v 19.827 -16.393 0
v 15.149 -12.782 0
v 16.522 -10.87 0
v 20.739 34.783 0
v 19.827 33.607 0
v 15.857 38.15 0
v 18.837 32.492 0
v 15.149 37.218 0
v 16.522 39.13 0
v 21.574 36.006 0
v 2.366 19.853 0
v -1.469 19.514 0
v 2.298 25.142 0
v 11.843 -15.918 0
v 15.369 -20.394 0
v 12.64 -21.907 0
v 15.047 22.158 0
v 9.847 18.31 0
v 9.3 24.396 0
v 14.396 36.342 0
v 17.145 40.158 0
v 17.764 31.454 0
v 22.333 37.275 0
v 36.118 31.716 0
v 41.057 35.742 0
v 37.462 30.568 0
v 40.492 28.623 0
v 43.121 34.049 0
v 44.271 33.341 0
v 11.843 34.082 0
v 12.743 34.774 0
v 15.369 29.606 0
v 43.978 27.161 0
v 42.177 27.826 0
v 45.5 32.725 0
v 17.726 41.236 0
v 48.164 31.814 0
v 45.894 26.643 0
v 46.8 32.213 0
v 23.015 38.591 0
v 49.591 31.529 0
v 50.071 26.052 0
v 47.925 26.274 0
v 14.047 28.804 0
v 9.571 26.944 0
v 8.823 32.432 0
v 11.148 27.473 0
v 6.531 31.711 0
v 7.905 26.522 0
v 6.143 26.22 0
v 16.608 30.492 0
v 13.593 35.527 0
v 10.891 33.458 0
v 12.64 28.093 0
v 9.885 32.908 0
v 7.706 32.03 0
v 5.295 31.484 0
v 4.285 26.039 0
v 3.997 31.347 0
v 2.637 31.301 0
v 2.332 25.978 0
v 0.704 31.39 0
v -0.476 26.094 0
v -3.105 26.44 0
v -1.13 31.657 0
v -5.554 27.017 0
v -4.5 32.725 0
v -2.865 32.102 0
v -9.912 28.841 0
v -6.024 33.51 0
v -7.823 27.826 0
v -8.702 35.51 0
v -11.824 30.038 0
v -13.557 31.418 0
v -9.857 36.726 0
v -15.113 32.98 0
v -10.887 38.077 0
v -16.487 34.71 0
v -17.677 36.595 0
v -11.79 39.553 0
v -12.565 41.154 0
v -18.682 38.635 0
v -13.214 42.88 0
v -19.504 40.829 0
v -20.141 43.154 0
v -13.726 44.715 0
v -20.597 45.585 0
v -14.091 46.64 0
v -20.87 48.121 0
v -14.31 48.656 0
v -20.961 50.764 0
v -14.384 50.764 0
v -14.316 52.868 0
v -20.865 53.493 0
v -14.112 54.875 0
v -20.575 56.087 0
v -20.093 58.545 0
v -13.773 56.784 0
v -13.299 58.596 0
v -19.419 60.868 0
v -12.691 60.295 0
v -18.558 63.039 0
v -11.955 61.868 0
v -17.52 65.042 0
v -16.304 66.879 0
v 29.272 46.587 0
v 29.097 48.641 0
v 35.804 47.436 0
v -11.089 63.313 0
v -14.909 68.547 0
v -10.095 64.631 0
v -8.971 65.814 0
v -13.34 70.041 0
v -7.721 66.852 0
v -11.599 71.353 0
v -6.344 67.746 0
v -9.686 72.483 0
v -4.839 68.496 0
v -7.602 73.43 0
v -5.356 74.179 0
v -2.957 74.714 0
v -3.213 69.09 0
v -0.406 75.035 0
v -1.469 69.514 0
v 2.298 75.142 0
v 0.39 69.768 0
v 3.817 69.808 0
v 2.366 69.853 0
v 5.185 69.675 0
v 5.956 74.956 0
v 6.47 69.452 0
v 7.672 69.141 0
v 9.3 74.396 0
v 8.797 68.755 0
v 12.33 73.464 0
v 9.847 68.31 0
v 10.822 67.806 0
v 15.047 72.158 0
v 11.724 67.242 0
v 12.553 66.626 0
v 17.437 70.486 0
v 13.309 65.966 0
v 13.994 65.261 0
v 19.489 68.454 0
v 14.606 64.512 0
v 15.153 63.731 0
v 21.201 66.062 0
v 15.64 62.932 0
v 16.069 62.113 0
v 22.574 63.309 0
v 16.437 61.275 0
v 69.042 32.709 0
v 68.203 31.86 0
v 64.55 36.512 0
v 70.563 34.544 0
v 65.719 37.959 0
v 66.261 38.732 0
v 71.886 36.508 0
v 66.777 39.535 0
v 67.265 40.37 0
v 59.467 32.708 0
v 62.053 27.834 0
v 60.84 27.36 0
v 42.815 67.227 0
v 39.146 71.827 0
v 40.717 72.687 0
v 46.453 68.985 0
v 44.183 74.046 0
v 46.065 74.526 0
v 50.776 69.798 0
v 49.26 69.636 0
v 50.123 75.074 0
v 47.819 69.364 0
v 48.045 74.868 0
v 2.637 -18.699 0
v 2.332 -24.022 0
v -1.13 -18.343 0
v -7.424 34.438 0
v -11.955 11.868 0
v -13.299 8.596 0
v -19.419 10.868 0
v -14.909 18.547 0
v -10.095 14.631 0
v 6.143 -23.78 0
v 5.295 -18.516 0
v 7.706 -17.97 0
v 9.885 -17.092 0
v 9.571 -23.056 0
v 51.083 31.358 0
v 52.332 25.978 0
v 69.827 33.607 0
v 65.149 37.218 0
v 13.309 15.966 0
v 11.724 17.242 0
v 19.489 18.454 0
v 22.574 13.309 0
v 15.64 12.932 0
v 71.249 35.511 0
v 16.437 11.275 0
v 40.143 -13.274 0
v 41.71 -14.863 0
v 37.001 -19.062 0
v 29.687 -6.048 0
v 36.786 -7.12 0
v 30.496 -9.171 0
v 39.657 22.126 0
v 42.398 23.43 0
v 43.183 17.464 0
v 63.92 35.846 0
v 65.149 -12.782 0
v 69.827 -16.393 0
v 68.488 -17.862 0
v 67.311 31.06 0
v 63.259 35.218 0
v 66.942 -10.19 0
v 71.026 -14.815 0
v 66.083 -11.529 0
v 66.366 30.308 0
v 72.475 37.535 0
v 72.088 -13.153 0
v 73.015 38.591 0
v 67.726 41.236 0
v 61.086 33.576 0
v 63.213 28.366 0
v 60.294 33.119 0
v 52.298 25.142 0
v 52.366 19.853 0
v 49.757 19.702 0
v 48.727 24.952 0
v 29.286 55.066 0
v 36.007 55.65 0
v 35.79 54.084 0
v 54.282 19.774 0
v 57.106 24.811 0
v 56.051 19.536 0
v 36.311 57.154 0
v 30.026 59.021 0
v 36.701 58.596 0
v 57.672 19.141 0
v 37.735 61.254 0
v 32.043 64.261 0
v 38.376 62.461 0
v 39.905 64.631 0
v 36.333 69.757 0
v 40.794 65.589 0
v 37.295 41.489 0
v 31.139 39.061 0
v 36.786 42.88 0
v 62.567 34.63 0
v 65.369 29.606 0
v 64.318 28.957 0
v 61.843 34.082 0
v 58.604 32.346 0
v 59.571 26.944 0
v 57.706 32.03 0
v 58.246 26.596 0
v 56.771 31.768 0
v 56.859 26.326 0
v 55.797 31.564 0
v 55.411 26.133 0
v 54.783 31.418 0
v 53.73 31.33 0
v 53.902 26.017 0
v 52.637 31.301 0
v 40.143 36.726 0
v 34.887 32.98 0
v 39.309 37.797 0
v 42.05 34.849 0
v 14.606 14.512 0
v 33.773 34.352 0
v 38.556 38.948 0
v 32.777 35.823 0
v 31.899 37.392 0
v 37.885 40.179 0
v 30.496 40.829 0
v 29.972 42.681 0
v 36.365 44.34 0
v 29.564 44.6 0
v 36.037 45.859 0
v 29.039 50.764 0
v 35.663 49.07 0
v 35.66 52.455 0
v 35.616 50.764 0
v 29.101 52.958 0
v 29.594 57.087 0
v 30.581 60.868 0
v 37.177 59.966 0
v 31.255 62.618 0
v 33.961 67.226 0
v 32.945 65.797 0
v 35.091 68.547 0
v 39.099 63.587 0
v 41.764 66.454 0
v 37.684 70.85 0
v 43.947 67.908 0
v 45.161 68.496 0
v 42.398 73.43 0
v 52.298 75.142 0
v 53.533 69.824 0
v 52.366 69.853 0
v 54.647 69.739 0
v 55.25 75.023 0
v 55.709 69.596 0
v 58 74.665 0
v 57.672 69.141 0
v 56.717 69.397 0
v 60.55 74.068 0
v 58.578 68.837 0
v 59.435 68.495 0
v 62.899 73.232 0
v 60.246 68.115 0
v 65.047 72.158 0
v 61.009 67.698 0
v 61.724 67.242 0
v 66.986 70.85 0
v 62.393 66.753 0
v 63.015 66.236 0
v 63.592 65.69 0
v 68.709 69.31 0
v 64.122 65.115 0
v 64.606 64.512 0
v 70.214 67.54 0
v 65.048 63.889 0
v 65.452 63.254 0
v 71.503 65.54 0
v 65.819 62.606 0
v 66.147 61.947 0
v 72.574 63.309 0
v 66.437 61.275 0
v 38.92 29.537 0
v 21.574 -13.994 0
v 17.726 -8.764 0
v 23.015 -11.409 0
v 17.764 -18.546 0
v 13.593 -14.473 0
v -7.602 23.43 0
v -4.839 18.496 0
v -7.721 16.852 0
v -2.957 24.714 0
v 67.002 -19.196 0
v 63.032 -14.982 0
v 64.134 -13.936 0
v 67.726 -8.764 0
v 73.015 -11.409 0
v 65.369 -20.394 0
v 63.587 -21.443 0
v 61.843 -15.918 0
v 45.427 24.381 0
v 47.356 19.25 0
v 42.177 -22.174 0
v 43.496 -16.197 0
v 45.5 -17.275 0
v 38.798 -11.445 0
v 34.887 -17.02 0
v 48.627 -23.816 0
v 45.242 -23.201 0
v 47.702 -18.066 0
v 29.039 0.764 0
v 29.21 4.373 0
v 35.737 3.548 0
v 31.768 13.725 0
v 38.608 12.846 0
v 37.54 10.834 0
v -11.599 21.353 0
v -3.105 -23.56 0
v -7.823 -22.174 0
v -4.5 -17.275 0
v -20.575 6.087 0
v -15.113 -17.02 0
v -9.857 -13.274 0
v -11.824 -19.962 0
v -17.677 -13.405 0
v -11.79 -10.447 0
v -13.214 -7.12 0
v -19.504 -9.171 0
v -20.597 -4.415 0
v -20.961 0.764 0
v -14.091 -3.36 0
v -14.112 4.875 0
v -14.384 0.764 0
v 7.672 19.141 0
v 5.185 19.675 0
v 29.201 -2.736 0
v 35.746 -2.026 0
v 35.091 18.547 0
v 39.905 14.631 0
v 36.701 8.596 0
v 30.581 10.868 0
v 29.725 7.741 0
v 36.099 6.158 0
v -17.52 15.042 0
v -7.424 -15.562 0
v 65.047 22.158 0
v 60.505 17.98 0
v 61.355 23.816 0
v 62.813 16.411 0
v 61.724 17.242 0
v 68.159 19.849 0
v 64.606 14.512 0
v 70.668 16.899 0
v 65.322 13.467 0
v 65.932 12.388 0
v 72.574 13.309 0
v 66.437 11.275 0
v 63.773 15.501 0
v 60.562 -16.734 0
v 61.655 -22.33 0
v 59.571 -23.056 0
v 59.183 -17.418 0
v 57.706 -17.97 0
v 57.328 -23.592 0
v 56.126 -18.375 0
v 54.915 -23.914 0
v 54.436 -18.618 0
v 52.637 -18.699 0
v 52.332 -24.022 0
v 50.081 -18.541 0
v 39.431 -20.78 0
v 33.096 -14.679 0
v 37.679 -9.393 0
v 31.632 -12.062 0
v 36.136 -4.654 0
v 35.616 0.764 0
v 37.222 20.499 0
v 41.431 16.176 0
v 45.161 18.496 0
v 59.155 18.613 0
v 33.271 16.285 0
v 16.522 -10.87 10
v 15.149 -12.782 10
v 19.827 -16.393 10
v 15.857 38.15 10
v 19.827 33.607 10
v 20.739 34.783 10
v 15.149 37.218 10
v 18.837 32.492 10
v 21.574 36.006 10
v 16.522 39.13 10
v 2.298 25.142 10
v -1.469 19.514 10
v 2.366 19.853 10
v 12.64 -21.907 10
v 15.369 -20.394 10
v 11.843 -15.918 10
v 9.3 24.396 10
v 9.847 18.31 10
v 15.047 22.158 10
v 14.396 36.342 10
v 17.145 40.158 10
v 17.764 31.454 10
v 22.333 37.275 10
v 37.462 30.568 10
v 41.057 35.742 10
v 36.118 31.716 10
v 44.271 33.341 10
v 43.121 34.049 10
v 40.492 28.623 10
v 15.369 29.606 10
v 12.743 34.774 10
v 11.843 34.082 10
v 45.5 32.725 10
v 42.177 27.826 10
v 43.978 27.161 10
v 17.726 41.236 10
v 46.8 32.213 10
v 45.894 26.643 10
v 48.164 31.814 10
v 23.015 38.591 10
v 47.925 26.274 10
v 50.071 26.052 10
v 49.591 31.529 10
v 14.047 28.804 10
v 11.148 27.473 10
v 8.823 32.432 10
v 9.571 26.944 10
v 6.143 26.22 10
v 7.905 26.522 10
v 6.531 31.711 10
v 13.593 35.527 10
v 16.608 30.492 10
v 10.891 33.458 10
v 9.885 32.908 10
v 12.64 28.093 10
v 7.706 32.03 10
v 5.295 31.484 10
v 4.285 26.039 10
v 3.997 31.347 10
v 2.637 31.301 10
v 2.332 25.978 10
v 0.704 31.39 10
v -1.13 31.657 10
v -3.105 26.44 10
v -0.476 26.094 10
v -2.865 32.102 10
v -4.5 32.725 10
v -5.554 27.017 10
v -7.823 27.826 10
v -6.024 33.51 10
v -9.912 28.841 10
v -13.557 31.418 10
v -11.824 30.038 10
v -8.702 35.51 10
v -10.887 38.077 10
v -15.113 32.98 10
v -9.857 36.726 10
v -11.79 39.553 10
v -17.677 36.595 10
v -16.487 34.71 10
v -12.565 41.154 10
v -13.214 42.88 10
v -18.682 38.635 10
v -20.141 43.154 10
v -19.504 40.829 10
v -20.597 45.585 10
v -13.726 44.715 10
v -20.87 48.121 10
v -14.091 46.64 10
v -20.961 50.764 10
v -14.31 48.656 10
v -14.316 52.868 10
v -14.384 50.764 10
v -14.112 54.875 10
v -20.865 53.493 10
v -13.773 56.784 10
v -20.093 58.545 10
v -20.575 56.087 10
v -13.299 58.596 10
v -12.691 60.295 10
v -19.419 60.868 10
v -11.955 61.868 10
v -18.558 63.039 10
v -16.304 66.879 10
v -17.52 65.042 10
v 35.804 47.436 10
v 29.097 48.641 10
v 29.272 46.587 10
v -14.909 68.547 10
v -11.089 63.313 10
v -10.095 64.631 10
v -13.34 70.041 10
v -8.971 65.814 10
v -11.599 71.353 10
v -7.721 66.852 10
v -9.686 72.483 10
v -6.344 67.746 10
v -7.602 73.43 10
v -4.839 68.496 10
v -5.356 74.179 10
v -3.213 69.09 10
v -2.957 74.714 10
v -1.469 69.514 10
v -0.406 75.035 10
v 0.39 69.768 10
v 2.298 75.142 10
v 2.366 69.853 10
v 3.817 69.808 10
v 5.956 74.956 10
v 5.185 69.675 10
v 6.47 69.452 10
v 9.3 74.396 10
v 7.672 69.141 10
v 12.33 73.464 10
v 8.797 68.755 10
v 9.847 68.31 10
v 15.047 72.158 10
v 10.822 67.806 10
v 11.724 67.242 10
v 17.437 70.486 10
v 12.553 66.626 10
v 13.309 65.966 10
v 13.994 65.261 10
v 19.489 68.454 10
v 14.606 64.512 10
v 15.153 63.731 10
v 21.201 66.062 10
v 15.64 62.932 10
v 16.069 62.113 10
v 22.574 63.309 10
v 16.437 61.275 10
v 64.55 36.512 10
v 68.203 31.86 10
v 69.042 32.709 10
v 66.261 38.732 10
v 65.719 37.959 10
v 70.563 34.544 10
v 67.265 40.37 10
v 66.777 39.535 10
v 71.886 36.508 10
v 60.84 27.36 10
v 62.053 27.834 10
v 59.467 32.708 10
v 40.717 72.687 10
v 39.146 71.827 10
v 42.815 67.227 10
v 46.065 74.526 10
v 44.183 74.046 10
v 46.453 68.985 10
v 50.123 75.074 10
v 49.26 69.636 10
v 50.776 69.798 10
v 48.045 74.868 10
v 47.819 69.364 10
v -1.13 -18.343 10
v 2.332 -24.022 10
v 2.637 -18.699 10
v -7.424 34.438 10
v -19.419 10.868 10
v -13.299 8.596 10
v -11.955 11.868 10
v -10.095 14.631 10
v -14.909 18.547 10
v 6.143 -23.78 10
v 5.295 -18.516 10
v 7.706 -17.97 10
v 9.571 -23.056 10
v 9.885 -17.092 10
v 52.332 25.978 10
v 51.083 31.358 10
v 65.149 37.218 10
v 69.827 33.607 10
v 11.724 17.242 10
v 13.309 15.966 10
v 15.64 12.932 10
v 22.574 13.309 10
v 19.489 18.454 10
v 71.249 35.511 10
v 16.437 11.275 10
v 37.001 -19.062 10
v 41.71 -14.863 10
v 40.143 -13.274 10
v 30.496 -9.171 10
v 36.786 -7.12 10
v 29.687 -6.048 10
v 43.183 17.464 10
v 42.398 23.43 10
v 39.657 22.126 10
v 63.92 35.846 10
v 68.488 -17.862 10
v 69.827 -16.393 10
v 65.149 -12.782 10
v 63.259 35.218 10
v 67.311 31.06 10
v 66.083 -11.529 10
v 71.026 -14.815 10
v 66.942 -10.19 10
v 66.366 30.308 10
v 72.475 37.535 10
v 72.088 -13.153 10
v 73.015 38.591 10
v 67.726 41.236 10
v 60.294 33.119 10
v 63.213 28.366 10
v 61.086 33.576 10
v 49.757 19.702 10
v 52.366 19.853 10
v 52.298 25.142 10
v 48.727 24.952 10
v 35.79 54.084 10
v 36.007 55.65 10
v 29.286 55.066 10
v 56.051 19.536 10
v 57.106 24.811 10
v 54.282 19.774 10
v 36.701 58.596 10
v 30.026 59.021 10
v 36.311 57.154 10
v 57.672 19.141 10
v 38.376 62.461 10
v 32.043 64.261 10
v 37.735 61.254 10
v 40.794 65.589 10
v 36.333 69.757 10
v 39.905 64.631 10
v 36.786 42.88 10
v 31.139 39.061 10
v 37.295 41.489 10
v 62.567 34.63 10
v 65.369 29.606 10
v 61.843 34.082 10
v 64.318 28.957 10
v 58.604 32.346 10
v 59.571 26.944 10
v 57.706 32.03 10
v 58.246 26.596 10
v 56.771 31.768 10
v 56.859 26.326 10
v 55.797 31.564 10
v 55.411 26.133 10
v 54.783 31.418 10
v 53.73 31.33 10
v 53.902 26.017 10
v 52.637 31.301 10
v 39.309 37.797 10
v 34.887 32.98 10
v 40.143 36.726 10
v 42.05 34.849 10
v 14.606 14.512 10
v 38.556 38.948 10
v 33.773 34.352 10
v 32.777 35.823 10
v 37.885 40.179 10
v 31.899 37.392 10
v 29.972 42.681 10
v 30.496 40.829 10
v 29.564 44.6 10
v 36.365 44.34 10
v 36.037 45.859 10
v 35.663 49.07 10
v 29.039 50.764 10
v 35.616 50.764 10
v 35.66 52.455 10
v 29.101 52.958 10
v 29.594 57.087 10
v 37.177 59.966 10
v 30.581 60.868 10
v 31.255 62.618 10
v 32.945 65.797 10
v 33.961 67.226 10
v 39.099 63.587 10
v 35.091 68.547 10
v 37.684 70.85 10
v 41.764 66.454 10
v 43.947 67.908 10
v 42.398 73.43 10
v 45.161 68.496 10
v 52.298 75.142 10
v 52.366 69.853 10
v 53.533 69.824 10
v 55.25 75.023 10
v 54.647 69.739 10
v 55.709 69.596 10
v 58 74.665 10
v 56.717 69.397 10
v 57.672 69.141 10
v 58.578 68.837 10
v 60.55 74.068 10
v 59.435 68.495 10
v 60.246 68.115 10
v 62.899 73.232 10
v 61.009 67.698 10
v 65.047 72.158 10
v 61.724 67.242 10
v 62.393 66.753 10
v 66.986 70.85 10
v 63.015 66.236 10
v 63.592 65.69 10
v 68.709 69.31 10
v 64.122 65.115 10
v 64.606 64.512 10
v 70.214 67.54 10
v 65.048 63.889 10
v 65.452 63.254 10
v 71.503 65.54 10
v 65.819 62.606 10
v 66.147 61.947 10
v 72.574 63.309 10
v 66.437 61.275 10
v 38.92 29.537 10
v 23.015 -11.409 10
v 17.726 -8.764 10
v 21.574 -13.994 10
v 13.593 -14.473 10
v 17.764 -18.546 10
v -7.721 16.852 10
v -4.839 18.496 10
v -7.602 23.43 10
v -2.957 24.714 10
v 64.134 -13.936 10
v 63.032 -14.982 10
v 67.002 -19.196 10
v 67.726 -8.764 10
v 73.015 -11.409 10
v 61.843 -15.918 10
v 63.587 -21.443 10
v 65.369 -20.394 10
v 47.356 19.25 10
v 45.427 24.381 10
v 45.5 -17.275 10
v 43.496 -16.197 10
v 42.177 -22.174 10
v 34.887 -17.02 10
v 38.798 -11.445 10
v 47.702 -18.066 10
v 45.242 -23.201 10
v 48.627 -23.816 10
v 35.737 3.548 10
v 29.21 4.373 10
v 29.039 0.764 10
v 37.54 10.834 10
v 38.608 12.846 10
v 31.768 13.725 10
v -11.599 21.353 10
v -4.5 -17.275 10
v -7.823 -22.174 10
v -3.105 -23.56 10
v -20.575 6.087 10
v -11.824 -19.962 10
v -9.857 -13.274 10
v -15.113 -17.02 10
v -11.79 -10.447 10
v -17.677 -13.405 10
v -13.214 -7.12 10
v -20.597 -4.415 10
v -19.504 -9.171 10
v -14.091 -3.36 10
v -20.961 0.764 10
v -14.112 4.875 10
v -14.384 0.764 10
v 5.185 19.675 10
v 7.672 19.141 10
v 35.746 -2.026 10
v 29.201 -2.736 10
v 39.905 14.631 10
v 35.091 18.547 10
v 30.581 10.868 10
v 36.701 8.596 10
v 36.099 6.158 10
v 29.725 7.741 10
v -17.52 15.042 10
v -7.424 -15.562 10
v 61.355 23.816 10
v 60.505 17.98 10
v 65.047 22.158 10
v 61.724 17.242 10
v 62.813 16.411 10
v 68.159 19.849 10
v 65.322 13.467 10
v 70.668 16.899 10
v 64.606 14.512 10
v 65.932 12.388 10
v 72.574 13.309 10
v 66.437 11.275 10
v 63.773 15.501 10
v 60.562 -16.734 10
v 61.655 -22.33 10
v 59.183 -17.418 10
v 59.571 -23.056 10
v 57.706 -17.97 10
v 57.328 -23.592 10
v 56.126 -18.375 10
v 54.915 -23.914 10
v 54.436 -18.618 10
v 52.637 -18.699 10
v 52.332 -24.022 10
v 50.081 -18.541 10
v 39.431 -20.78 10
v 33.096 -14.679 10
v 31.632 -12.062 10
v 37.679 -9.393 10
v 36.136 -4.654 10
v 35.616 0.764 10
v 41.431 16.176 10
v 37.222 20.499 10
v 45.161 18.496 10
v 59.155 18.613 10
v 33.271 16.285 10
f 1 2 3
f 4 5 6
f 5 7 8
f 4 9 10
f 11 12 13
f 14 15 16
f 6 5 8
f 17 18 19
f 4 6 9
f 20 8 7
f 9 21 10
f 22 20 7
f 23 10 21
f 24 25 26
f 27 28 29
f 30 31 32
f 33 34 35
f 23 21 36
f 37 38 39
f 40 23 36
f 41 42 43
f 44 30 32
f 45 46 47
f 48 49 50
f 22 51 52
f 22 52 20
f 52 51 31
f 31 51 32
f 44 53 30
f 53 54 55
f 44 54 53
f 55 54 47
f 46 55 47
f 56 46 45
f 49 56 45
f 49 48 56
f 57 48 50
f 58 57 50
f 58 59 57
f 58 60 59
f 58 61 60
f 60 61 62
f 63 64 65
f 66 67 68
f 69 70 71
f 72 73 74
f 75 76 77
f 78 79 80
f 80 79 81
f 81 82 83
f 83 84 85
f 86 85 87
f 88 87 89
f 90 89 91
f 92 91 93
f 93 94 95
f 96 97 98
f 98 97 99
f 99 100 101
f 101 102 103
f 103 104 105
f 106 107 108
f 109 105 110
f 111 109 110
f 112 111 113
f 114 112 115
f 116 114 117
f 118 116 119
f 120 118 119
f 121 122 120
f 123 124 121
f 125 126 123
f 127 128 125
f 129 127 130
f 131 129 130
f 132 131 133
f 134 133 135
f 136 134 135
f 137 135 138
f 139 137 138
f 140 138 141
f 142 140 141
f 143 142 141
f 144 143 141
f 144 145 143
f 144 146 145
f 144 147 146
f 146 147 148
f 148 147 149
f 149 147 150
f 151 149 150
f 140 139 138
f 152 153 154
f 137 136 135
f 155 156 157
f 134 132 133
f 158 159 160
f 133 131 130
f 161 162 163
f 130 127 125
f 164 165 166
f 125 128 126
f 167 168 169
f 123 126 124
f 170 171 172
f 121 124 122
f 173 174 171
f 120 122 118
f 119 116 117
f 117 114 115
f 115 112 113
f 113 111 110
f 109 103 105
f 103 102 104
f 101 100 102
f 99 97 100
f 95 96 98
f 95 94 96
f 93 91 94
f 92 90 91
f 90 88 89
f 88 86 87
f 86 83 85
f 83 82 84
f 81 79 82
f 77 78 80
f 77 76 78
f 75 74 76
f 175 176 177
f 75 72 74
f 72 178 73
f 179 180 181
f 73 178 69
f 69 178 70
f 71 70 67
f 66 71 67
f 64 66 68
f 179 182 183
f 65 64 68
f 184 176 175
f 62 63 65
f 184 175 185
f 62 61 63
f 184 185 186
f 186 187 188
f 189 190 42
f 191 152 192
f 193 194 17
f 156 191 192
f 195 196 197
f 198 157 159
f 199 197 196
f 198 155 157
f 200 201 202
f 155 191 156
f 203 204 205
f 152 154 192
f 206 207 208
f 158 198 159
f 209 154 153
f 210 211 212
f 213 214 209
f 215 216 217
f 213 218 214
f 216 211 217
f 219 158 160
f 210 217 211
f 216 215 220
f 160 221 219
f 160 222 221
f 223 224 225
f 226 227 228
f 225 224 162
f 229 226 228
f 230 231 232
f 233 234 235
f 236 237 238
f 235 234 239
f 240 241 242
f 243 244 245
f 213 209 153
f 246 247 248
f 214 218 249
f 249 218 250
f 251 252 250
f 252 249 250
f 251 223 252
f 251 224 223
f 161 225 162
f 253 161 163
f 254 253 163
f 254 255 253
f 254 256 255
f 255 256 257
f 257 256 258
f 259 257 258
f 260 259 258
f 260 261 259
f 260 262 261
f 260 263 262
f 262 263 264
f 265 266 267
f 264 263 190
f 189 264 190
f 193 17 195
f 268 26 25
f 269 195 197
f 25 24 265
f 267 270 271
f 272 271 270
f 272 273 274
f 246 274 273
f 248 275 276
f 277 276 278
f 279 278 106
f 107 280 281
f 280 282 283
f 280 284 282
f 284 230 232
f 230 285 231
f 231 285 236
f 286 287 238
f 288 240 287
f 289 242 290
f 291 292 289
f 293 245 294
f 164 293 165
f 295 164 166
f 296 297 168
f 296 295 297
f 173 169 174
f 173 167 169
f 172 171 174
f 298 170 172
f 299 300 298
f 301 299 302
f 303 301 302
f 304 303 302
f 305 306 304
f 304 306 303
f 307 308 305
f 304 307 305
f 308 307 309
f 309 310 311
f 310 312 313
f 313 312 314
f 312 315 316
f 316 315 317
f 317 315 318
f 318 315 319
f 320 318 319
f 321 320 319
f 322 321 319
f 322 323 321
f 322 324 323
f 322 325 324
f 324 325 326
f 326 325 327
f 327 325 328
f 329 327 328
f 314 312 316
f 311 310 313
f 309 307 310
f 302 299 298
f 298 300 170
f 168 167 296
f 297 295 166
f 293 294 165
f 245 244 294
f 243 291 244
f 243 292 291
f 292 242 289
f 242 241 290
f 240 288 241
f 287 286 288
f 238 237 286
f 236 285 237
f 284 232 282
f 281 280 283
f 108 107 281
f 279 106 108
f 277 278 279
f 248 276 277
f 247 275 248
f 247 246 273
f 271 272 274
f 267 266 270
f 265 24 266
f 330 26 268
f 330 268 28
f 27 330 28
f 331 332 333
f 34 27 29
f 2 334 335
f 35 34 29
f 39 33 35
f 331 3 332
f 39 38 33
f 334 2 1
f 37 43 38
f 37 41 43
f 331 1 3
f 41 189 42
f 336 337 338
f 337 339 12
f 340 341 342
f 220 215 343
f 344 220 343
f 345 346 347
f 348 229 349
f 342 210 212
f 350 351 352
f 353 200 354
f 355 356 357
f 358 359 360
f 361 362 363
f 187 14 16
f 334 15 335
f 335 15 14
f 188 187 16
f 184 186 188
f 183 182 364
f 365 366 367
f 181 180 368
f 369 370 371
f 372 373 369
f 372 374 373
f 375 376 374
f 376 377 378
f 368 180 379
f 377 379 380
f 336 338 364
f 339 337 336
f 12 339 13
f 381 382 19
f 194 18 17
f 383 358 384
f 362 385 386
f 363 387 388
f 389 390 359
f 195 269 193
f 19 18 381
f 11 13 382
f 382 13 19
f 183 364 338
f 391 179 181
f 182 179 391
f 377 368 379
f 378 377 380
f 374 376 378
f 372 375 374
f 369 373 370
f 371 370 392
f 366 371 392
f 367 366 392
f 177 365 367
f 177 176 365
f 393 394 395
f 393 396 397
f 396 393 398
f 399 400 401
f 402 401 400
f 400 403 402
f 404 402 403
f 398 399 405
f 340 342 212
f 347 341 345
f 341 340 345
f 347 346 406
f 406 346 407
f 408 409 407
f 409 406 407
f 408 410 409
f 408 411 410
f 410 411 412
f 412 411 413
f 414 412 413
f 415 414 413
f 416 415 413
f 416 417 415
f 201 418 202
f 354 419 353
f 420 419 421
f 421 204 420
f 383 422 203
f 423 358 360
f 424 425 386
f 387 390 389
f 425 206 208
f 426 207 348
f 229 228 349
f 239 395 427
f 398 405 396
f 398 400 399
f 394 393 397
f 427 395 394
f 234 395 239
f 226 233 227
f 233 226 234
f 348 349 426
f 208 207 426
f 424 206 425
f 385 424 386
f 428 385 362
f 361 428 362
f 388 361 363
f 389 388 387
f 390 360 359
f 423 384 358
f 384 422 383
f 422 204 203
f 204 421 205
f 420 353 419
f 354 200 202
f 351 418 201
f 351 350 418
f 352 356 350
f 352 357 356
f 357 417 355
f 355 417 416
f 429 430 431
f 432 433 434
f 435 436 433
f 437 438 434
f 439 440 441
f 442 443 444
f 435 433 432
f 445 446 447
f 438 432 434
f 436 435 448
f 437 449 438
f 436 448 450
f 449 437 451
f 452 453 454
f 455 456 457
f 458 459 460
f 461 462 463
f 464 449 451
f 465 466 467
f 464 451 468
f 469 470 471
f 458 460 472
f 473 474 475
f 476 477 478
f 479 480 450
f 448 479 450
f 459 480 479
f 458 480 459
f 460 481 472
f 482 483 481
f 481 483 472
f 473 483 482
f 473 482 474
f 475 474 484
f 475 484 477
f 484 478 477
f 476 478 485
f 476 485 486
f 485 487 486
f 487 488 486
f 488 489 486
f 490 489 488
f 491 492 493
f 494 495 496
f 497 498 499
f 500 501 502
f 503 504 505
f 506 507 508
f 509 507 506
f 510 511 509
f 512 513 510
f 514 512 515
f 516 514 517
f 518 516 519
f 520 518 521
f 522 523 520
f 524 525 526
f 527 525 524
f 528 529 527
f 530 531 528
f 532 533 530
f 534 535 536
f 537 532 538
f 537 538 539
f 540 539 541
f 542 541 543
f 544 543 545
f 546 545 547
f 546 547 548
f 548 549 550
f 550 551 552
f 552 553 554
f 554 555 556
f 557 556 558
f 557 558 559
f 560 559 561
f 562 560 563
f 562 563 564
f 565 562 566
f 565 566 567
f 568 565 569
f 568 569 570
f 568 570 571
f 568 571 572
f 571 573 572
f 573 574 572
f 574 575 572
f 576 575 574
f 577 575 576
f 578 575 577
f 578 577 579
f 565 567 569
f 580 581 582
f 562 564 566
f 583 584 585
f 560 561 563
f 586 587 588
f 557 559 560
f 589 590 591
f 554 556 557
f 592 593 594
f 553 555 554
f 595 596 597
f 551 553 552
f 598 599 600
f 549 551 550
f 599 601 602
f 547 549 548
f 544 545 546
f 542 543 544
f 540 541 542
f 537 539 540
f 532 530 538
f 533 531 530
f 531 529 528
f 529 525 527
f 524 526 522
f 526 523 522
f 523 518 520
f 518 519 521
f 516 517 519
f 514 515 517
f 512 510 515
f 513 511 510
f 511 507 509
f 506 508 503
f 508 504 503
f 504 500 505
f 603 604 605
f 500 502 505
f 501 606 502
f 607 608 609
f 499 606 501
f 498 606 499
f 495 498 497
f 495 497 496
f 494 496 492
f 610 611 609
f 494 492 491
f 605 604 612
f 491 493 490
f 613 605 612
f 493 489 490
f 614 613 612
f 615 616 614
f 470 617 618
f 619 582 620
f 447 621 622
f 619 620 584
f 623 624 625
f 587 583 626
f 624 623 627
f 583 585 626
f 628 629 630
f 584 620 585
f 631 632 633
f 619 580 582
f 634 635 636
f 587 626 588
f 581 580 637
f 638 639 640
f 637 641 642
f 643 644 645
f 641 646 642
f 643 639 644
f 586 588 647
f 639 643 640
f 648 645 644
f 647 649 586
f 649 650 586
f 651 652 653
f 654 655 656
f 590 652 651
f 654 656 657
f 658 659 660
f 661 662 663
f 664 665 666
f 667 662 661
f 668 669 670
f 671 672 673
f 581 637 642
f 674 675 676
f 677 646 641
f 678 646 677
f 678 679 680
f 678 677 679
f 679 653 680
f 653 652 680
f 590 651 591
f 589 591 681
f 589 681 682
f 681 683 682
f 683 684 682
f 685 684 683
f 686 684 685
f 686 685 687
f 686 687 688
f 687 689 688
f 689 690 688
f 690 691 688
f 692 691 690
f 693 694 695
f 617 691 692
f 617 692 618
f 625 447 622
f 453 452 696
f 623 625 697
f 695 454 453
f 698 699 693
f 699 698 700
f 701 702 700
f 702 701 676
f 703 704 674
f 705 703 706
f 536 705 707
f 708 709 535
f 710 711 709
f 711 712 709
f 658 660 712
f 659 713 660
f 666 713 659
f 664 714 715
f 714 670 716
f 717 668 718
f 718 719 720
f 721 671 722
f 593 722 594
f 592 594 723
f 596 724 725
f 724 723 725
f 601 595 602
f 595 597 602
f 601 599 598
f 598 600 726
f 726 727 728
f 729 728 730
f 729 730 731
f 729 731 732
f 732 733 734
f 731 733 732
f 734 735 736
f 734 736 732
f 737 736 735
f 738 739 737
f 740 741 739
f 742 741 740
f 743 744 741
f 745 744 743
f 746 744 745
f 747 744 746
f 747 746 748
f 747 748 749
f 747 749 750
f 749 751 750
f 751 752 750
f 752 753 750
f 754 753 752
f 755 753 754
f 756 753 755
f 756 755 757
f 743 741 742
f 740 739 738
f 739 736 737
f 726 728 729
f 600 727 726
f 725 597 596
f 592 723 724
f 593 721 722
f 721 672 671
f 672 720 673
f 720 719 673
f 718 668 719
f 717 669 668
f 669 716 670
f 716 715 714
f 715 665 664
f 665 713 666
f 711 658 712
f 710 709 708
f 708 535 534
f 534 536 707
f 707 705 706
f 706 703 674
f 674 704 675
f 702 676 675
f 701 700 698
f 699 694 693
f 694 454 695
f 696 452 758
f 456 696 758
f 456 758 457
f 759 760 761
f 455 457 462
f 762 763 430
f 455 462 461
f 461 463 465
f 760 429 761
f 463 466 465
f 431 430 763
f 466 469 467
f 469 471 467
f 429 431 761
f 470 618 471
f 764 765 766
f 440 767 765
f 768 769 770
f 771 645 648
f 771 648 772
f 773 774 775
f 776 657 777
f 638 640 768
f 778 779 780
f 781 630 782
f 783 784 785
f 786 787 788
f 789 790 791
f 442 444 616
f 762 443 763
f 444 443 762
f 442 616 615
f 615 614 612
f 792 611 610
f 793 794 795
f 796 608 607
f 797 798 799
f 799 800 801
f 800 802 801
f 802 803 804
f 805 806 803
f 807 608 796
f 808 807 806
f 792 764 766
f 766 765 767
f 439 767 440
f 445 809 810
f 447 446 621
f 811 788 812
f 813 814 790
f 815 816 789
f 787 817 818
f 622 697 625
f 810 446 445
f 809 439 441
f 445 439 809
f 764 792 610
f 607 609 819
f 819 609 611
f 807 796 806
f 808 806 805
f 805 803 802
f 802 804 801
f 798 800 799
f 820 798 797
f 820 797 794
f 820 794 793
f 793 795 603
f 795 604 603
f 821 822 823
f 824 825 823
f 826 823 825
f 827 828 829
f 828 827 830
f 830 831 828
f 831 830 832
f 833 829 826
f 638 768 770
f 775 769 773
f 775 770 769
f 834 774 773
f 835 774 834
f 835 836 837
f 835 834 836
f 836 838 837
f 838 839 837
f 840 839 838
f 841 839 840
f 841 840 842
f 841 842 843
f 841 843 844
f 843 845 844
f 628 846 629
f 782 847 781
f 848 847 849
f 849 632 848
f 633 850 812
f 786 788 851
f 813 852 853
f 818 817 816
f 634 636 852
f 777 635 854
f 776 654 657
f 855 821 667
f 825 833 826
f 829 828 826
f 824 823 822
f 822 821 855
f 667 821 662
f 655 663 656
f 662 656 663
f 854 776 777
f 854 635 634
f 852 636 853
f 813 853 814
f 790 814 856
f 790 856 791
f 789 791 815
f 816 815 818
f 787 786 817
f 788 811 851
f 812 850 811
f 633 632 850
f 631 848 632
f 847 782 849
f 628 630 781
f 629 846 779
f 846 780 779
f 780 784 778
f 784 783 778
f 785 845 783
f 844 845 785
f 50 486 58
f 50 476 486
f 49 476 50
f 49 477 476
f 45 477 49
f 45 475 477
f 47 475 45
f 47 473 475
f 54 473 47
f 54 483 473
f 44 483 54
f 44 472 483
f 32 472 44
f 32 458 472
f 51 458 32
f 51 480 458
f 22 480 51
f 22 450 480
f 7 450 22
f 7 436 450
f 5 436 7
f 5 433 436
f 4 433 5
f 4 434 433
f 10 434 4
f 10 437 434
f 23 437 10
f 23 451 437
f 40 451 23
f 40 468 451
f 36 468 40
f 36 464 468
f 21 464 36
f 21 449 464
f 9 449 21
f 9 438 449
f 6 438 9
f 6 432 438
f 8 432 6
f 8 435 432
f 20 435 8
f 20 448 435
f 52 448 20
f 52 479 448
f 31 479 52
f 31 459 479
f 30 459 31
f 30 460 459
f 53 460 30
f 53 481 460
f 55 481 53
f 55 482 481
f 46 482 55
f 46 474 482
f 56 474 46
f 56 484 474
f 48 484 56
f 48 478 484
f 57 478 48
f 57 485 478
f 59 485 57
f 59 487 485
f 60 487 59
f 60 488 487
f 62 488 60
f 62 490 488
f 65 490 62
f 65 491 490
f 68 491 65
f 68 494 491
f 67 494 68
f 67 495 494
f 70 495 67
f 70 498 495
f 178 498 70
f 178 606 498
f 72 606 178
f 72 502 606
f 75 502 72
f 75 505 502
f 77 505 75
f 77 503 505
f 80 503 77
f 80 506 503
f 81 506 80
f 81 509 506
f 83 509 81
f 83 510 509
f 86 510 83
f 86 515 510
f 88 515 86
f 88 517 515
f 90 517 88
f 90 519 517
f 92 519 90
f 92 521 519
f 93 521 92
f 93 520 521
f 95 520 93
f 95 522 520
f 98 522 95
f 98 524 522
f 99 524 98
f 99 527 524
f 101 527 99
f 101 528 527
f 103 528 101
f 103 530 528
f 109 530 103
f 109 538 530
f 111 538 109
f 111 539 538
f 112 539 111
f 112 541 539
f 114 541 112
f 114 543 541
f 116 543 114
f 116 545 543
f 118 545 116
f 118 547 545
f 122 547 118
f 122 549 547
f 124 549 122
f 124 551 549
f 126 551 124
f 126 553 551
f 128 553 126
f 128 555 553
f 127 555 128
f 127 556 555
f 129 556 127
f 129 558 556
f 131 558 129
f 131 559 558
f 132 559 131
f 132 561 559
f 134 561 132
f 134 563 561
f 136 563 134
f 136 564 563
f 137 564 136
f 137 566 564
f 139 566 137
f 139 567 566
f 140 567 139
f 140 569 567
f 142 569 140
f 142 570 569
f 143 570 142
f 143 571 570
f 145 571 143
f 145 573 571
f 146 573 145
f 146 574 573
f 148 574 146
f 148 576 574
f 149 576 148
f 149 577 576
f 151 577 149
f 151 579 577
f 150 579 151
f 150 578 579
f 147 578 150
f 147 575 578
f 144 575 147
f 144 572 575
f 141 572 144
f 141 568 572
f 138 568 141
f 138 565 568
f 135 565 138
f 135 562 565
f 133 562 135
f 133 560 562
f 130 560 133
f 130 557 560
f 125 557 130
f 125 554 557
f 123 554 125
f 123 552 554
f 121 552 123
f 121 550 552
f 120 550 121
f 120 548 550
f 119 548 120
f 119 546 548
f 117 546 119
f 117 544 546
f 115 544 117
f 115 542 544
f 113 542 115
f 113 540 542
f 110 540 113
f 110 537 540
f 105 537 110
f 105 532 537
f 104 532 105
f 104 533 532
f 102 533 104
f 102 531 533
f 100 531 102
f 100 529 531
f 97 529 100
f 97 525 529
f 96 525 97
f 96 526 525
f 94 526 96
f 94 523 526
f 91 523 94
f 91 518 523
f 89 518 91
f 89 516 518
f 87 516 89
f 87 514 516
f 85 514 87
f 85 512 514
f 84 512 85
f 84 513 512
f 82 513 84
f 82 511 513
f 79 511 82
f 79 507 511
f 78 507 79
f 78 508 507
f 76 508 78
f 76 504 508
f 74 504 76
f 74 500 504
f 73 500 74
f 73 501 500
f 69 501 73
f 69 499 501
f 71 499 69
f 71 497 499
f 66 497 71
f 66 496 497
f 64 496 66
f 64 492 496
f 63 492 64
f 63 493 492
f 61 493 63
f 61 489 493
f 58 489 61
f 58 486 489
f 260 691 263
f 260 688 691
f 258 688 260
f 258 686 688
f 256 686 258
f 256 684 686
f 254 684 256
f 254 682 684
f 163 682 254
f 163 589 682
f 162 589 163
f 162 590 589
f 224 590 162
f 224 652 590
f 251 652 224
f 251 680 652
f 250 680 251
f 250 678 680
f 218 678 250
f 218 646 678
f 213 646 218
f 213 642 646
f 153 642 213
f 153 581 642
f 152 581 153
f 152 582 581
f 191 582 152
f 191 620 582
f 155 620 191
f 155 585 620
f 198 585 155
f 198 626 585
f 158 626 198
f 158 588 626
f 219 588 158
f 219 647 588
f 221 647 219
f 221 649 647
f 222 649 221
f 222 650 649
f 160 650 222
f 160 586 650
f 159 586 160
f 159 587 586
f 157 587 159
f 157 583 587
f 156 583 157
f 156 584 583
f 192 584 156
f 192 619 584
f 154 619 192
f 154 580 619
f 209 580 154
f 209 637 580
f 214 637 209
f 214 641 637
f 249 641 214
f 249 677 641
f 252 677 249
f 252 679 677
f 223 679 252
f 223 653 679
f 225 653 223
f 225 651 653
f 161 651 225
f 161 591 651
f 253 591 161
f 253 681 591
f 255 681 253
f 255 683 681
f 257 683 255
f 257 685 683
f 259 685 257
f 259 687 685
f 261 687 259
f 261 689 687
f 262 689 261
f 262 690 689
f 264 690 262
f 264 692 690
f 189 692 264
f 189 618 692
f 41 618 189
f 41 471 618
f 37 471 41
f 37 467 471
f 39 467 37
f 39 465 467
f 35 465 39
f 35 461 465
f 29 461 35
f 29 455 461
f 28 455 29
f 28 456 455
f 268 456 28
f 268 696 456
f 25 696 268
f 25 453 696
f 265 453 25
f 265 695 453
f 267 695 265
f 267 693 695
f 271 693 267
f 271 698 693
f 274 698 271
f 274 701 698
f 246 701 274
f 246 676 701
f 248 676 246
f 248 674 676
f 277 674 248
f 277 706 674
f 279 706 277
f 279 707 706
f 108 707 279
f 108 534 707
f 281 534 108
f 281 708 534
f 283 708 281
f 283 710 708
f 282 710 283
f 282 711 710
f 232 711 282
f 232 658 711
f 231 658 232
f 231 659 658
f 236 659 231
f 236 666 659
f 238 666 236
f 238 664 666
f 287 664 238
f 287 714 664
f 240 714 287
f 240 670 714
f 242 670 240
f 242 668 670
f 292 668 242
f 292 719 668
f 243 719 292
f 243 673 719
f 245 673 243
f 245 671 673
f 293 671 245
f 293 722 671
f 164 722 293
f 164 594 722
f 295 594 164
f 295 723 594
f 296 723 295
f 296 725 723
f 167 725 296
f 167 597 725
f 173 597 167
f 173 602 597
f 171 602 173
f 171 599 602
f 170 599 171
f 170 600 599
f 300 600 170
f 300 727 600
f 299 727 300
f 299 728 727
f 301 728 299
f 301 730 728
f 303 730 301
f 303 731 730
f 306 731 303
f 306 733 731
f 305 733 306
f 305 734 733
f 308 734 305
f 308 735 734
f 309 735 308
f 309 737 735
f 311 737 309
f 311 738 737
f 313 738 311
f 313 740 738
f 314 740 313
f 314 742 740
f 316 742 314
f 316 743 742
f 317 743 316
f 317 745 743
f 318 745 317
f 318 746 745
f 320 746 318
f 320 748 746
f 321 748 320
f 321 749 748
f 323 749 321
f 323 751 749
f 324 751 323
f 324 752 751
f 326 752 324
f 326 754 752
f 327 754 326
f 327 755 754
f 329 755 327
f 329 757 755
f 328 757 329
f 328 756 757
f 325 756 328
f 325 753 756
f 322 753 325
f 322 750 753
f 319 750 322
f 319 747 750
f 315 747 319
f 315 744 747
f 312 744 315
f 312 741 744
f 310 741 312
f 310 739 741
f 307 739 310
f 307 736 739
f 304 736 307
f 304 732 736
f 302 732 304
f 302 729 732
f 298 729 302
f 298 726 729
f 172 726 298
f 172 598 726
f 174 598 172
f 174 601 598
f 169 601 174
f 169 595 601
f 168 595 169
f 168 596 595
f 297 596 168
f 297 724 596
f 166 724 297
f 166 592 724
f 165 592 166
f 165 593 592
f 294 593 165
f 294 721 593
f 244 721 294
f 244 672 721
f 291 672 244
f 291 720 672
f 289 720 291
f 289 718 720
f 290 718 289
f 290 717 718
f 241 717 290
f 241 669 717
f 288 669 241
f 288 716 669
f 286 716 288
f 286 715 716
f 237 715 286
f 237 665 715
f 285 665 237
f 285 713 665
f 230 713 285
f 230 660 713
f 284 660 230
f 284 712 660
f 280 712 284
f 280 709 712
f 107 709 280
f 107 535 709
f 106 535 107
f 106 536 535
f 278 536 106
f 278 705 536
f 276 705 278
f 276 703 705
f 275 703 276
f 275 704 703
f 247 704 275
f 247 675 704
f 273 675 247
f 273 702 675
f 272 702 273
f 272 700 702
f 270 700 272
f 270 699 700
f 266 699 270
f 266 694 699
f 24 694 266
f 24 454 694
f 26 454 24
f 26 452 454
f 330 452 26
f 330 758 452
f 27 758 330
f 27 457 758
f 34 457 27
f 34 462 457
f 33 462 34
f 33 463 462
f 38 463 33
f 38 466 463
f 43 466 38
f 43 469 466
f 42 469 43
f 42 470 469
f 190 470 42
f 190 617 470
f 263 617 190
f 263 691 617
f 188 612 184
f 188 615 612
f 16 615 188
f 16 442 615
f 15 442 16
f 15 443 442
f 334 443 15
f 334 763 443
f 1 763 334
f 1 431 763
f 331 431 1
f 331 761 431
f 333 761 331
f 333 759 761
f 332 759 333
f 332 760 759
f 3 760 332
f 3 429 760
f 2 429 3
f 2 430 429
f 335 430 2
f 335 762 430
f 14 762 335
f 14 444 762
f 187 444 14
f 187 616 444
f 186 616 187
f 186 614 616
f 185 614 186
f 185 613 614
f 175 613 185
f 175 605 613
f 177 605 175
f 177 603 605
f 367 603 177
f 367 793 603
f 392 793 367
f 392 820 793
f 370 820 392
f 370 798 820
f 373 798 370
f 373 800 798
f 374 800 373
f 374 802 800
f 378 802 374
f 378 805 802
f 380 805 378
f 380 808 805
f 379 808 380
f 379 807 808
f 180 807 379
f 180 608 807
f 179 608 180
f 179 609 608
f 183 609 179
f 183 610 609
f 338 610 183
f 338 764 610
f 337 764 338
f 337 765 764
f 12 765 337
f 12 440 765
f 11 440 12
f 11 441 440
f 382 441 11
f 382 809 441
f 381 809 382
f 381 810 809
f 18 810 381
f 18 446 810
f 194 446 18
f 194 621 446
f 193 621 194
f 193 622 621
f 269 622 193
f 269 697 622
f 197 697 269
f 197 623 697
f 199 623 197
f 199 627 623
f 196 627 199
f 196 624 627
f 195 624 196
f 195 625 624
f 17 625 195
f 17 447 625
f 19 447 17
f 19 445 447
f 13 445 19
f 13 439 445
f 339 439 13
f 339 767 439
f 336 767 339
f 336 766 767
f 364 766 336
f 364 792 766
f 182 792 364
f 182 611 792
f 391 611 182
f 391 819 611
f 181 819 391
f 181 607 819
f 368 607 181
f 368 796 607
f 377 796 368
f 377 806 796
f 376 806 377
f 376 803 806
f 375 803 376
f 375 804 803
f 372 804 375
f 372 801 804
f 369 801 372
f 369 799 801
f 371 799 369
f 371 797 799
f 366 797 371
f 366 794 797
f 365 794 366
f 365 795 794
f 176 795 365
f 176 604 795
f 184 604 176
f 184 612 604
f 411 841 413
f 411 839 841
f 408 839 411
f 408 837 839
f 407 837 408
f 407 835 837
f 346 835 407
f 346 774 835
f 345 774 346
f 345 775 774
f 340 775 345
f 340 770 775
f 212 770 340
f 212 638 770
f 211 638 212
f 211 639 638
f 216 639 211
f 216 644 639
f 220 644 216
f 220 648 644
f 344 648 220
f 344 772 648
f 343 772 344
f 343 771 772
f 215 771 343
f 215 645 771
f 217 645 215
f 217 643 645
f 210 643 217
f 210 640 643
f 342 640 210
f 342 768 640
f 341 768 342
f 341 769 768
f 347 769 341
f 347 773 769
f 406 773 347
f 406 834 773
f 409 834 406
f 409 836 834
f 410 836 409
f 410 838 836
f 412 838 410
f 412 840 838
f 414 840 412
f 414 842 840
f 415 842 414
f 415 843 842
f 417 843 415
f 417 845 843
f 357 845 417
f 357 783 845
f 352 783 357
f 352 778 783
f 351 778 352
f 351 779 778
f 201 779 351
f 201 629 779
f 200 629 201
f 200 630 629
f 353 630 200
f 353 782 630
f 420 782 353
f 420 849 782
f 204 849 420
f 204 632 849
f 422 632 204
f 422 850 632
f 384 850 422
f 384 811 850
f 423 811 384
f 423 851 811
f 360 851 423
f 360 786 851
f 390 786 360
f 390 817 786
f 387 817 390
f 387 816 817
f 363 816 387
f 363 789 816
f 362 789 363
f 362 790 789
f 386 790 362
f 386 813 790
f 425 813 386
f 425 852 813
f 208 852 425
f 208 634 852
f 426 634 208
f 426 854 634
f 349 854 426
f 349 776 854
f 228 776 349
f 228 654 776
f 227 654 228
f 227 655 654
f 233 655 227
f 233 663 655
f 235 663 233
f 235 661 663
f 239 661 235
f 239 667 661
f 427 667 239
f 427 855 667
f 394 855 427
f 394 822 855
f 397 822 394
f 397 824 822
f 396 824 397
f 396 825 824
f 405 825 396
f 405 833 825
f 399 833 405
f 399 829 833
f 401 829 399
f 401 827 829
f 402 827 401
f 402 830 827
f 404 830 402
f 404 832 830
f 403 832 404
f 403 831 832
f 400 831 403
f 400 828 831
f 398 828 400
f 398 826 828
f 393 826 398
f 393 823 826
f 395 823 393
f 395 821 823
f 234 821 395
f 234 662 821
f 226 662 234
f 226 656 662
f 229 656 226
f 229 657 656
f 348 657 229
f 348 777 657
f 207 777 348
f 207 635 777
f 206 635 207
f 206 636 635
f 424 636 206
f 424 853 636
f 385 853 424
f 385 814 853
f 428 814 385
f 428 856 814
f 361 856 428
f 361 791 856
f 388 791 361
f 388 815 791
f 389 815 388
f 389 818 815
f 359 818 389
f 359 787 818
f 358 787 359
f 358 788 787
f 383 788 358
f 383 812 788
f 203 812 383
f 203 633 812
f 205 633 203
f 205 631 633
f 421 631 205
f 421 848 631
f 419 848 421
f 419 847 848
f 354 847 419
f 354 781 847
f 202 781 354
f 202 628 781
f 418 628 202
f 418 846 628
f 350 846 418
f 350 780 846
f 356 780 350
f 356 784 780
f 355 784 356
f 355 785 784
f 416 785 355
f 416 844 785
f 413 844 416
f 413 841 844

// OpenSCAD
// Volume: 26537.04762908802, SurfaceArea: 14668.451006948671
module letter(c) {
    text(c, size = 50, font = "Liberation Sans", halign = "center", valign = "center");
}

linear_extrude(height = 10) {
    letter("C", $fn=8);
    translate([50,0]) letter("C", $fn=16);
    translate([0,50]) letter("C", $fn=24);
    translate([50,50]) letter("C", $fn=32);
}
